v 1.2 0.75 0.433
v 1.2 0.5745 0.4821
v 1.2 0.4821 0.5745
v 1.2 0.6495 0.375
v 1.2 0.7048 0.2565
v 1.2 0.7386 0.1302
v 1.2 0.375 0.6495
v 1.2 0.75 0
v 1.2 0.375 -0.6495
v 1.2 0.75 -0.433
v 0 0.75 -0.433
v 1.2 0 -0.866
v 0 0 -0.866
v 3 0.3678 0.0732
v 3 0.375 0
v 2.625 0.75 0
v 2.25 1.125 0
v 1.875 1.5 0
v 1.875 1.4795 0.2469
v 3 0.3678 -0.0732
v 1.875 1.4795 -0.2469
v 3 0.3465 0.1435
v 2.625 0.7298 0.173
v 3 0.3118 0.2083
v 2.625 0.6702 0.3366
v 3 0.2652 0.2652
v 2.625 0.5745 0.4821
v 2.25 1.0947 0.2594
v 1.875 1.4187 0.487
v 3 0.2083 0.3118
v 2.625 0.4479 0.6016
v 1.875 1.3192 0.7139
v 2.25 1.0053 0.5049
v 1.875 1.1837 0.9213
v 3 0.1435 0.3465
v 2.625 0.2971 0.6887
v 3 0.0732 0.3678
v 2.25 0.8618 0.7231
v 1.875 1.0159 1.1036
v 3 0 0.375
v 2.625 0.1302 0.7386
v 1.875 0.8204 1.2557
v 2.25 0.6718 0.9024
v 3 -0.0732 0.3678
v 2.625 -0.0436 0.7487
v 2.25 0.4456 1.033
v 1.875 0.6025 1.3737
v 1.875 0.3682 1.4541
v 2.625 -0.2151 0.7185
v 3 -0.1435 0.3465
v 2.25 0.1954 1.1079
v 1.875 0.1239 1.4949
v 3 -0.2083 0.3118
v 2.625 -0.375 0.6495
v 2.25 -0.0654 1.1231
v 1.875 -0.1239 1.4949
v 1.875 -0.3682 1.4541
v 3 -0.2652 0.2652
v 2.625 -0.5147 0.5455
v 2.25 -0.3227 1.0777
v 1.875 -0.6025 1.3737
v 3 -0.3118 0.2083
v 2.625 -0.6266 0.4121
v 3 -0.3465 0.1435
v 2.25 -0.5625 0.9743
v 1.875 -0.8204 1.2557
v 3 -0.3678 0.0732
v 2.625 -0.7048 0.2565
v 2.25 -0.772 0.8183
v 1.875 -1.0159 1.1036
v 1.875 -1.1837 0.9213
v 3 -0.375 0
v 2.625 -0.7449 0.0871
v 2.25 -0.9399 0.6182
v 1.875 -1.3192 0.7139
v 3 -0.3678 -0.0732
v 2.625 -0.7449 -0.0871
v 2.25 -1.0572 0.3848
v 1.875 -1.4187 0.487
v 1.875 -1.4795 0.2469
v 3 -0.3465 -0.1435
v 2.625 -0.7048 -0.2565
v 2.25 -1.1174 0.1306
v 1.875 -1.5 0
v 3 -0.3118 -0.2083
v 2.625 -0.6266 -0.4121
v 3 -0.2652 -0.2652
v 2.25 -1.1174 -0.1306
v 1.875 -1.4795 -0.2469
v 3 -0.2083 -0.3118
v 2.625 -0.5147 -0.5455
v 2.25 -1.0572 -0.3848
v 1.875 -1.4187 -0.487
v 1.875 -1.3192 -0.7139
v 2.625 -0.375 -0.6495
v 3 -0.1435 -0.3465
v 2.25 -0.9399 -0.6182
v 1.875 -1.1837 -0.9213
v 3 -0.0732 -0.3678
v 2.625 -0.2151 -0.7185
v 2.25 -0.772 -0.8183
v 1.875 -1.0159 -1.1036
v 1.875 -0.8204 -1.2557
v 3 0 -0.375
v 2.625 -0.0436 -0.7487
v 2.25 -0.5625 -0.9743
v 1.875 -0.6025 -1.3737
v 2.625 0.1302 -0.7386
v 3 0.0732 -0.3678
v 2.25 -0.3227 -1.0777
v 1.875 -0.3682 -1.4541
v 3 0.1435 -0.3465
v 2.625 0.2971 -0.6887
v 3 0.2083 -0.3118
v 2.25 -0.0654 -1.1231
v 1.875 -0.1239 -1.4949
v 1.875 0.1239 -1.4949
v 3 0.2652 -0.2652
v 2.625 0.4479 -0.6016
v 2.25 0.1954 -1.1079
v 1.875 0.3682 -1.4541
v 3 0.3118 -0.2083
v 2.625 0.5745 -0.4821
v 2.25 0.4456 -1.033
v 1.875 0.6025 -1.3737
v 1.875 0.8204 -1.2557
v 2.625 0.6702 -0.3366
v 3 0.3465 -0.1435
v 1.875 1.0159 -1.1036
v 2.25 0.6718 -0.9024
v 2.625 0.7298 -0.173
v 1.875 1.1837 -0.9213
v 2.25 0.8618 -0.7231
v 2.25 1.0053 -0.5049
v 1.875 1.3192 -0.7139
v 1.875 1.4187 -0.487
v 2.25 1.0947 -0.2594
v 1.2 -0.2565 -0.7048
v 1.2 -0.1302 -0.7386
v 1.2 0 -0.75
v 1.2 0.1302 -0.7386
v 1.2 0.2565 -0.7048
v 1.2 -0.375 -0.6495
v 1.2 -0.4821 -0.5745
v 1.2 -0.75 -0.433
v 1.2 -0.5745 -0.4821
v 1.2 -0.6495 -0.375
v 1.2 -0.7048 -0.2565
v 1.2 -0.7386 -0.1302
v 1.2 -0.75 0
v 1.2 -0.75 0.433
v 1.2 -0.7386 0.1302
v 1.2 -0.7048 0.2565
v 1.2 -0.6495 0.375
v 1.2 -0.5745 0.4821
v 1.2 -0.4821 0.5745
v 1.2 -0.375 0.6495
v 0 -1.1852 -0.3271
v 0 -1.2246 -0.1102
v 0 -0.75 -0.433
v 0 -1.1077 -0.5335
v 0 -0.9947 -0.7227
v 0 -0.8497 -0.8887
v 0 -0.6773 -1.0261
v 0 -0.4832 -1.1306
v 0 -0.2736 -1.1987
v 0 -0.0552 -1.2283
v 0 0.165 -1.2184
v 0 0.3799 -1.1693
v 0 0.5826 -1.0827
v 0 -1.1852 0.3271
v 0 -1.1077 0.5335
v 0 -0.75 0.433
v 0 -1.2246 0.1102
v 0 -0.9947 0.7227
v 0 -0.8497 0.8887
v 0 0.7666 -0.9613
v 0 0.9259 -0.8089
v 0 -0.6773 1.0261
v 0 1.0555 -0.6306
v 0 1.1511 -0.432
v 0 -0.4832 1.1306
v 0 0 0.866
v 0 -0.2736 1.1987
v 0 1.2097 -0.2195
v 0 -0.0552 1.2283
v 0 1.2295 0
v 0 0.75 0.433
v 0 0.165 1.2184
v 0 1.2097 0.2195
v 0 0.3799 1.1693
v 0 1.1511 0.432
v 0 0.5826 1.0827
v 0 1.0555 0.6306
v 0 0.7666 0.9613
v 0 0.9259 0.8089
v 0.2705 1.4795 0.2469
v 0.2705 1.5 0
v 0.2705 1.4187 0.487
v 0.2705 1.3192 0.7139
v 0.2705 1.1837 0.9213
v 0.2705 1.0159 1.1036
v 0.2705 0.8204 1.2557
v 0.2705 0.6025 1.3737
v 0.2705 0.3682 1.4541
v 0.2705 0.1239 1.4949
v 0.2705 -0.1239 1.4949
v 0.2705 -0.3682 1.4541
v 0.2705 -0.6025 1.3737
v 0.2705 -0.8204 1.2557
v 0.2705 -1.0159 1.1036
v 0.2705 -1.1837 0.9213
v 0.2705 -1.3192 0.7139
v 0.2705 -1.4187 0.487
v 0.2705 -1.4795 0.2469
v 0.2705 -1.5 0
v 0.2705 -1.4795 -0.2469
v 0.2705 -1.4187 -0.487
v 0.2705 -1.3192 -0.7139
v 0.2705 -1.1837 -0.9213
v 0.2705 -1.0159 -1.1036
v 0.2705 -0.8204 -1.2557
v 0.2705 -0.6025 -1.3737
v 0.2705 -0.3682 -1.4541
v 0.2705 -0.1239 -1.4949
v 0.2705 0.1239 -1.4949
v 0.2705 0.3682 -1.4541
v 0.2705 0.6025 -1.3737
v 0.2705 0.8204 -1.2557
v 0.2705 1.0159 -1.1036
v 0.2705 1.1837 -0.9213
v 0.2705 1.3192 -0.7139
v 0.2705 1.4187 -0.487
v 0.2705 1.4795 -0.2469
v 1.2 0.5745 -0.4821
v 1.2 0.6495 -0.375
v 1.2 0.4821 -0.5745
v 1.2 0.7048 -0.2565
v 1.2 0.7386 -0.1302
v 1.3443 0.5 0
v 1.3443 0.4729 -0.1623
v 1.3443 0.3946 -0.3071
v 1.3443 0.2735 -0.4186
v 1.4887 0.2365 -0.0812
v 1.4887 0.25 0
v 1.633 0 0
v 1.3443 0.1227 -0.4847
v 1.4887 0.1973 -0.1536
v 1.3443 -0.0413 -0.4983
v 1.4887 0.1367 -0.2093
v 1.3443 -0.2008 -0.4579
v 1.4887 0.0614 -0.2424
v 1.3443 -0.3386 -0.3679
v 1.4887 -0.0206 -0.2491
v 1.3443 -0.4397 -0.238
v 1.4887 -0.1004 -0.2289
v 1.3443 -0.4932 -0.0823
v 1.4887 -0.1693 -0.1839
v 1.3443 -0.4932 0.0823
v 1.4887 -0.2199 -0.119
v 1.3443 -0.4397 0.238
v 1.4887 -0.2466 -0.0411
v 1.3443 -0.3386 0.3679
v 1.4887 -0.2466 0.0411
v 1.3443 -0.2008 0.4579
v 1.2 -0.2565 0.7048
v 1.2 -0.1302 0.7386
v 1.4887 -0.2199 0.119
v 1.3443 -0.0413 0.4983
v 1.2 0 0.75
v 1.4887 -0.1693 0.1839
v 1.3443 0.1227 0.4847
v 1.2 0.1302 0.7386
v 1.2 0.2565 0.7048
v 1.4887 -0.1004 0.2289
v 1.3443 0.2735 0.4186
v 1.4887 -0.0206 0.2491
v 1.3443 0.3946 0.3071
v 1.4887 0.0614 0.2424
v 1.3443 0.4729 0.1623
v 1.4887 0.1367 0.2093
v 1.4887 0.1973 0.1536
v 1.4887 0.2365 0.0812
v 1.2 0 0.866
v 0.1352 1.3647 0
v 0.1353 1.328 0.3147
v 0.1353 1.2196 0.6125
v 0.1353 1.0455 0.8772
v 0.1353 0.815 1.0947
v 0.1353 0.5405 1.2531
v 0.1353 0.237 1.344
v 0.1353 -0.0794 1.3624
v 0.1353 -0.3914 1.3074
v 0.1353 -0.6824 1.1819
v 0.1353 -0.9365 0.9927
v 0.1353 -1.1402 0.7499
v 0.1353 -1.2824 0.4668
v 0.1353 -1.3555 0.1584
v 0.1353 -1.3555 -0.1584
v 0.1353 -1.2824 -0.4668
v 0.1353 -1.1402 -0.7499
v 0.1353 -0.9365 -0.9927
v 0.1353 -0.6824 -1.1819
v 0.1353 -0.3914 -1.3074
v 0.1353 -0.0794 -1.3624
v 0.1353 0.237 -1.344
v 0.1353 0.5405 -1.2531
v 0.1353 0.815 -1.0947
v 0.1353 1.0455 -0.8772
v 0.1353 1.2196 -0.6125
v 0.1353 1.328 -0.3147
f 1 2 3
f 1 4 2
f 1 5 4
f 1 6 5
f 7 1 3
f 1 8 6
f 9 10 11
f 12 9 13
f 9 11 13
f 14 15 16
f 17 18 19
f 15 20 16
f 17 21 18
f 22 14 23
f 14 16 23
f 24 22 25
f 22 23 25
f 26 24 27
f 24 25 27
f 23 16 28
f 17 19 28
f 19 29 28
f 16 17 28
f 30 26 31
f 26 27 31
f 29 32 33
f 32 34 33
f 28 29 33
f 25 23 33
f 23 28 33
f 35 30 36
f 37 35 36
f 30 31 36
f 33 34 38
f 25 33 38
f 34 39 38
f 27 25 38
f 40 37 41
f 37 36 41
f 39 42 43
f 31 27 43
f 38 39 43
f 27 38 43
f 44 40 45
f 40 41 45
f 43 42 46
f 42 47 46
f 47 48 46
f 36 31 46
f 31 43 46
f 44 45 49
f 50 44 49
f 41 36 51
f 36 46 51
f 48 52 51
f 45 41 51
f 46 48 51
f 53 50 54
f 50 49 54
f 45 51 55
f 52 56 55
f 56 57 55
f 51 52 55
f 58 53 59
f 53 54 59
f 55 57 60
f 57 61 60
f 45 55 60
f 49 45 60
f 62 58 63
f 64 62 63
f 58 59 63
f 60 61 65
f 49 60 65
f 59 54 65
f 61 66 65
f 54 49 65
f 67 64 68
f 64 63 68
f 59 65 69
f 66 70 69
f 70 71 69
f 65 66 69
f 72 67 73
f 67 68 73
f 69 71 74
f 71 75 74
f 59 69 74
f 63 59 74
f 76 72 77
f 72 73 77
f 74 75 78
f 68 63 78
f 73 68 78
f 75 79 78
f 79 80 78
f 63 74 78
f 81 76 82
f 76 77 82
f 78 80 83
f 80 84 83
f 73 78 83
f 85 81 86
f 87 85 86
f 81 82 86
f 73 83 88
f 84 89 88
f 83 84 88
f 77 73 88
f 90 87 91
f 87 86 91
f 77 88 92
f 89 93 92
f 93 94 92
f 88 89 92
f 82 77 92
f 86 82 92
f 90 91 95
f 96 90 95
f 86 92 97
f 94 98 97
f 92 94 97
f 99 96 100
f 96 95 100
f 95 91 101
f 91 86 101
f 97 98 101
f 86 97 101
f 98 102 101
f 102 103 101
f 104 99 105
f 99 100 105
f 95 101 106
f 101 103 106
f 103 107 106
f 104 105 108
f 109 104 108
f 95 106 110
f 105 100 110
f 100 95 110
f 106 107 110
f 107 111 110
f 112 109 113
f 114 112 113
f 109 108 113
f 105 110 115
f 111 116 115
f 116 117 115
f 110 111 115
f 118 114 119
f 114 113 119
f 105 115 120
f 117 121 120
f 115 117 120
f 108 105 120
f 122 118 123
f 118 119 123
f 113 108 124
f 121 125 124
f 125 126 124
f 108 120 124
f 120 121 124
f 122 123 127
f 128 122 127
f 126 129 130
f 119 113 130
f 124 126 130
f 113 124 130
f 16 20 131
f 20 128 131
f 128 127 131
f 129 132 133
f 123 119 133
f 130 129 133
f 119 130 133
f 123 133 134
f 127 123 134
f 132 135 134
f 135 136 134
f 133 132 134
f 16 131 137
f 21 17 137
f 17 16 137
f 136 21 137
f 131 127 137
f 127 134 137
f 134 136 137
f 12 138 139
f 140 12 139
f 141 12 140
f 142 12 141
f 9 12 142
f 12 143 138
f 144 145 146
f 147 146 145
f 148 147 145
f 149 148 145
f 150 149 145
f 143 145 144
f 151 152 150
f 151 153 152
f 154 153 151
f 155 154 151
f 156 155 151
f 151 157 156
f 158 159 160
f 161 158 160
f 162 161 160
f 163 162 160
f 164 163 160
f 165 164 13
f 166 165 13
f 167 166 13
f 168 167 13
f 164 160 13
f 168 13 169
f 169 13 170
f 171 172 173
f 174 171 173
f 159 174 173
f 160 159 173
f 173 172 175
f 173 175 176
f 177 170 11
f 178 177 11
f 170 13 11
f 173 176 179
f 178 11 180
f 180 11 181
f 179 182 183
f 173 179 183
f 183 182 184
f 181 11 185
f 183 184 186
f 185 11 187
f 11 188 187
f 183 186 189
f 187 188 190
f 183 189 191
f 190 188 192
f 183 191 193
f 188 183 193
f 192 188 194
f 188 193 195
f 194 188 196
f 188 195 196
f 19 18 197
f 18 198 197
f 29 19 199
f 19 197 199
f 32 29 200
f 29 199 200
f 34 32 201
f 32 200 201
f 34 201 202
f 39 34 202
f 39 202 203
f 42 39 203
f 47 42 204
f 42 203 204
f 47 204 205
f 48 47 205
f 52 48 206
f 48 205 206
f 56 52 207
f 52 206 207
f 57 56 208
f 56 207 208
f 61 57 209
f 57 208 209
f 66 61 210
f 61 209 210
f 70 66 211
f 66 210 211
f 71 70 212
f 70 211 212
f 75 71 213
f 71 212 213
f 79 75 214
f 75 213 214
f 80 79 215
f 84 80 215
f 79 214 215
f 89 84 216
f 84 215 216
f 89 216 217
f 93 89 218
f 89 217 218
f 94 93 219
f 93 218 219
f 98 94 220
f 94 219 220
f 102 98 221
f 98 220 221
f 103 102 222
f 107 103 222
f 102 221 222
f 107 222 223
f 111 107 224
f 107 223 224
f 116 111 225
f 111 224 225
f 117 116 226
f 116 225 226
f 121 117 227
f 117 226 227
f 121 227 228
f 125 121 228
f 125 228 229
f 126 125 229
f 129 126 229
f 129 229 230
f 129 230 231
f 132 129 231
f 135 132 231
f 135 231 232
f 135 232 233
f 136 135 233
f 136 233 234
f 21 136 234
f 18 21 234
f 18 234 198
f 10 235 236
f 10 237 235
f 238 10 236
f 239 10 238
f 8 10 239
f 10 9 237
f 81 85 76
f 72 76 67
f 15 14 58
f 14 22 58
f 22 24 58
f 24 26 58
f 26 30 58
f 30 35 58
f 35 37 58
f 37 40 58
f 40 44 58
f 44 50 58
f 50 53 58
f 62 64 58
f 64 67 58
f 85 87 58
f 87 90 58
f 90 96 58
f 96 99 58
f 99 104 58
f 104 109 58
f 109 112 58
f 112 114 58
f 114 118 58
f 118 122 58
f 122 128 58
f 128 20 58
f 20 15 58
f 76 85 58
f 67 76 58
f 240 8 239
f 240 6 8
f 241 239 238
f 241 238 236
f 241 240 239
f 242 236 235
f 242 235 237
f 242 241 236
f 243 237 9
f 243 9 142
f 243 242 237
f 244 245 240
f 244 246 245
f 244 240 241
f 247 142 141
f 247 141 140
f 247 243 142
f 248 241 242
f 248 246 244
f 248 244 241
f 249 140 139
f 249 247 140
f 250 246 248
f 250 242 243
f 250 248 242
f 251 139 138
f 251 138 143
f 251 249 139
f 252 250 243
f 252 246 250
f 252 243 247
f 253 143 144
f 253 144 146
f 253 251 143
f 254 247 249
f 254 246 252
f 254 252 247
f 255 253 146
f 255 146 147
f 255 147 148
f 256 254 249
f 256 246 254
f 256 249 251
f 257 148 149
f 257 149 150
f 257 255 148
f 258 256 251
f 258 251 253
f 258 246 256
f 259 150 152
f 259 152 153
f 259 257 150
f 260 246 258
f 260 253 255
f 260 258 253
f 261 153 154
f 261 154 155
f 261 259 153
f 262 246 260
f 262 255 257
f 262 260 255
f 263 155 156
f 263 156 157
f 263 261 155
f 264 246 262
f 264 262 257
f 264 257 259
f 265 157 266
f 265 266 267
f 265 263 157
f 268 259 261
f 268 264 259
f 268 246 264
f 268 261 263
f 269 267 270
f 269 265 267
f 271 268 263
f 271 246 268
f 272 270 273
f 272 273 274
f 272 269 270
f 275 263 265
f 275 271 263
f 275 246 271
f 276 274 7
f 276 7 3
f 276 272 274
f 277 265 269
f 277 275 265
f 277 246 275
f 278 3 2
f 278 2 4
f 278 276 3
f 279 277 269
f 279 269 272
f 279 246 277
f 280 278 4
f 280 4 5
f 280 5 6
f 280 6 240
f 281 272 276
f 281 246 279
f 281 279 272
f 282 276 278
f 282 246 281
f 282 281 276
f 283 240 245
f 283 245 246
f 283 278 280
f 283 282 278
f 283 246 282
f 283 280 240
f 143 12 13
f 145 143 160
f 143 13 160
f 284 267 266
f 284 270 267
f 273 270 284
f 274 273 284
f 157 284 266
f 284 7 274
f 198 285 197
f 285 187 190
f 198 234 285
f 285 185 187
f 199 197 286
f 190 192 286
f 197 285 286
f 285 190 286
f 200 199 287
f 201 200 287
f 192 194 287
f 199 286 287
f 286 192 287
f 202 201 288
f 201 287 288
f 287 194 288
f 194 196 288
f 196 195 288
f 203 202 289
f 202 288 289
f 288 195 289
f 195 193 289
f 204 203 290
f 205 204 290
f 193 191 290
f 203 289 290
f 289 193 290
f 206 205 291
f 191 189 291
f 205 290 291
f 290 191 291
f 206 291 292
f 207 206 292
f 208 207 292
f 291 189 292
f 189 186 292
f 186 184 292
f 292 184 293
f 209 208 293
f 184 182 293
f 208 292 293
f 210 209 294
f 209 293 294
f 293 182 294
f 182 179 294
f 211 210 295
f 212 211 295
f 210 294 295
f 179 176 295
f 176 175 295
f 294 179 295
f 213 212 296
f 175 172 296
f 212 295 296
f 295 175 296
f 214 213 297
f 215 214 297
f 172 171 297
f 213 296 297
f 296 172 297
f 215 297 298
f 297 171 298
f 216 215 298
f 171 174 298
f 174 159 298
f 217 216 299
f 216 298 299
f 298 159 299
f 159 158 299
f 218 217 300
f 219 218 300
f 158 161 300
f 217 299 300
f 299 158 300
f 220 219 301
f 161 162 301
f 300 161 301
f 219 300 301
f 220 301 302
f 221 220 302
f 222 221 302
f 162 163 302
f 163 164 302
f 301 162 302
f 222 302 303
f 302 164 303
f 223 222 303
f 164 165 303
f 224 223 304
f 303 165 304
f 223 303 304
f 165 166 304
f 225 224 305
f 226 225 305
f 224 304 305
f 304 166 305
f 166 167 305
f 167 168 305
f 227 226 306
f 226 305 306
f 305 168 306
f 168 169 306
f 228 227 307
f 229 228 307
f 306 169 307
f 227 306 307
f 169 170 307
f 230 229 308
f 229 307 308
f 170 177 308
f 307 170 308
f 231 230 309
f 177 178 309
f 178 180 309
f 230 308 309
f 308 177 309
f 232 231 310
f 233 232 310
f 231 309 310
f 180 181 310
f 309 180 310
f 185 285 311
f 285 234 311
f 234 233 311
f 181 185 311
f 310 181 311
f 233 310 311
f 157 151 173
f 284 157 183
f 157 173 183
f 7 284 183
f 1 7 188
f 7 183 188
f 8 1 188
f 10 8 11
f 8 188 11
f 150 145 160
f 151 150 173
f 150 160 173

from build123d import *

# Parameters (mm, degrees)
HEXAGONSOCKET_DEPTH = 1.2


with BuildPart() as part:
    # Sketch1 → Base (revolve)
    with BuildSketch(Plane.XY):
        Polygon((0, 0), (3, 0), (3, 0.375), (1.875, 1.5), (0.2705, 1.5), (0, 1.2295), align=None)
    revolve(axis=Axis((-14.774129749, 0, 0), (1, 0, 0)))

    # Sketch2 → HexagonSocket (cut)
    with BuildSketch(Plane(origin=(0, 0.220293087, -0.139195271), x_dir=(0, 0, 1), z_dir=(-1, 0, 0))):
        Polygon((1.005220675, -0.220293087), (0.572207973, 0.529706913), (-0.293817431, 0.529706913), (-0.726830132, -0.220293087), (-0.293817431, -0.970293087), (0.572207973, -0.970293087), align=None)
    extrude(amount=-HEXAGONSOCKET_DEPTH, mode=Mode.SUBTRACT)

    # Sketch3 → Cut-Revolve (revolve, cut)
    with BuildSketch(Plane.XY):
        Polygon((1.2, 0.75), (1.633012702, 0), (1.2, 0), align=None)
    revolve(axis=Axis((1.2, 0, 0), (-1, 0, 0)), mode=Mode.SUBTRACT)


solid = part.part
